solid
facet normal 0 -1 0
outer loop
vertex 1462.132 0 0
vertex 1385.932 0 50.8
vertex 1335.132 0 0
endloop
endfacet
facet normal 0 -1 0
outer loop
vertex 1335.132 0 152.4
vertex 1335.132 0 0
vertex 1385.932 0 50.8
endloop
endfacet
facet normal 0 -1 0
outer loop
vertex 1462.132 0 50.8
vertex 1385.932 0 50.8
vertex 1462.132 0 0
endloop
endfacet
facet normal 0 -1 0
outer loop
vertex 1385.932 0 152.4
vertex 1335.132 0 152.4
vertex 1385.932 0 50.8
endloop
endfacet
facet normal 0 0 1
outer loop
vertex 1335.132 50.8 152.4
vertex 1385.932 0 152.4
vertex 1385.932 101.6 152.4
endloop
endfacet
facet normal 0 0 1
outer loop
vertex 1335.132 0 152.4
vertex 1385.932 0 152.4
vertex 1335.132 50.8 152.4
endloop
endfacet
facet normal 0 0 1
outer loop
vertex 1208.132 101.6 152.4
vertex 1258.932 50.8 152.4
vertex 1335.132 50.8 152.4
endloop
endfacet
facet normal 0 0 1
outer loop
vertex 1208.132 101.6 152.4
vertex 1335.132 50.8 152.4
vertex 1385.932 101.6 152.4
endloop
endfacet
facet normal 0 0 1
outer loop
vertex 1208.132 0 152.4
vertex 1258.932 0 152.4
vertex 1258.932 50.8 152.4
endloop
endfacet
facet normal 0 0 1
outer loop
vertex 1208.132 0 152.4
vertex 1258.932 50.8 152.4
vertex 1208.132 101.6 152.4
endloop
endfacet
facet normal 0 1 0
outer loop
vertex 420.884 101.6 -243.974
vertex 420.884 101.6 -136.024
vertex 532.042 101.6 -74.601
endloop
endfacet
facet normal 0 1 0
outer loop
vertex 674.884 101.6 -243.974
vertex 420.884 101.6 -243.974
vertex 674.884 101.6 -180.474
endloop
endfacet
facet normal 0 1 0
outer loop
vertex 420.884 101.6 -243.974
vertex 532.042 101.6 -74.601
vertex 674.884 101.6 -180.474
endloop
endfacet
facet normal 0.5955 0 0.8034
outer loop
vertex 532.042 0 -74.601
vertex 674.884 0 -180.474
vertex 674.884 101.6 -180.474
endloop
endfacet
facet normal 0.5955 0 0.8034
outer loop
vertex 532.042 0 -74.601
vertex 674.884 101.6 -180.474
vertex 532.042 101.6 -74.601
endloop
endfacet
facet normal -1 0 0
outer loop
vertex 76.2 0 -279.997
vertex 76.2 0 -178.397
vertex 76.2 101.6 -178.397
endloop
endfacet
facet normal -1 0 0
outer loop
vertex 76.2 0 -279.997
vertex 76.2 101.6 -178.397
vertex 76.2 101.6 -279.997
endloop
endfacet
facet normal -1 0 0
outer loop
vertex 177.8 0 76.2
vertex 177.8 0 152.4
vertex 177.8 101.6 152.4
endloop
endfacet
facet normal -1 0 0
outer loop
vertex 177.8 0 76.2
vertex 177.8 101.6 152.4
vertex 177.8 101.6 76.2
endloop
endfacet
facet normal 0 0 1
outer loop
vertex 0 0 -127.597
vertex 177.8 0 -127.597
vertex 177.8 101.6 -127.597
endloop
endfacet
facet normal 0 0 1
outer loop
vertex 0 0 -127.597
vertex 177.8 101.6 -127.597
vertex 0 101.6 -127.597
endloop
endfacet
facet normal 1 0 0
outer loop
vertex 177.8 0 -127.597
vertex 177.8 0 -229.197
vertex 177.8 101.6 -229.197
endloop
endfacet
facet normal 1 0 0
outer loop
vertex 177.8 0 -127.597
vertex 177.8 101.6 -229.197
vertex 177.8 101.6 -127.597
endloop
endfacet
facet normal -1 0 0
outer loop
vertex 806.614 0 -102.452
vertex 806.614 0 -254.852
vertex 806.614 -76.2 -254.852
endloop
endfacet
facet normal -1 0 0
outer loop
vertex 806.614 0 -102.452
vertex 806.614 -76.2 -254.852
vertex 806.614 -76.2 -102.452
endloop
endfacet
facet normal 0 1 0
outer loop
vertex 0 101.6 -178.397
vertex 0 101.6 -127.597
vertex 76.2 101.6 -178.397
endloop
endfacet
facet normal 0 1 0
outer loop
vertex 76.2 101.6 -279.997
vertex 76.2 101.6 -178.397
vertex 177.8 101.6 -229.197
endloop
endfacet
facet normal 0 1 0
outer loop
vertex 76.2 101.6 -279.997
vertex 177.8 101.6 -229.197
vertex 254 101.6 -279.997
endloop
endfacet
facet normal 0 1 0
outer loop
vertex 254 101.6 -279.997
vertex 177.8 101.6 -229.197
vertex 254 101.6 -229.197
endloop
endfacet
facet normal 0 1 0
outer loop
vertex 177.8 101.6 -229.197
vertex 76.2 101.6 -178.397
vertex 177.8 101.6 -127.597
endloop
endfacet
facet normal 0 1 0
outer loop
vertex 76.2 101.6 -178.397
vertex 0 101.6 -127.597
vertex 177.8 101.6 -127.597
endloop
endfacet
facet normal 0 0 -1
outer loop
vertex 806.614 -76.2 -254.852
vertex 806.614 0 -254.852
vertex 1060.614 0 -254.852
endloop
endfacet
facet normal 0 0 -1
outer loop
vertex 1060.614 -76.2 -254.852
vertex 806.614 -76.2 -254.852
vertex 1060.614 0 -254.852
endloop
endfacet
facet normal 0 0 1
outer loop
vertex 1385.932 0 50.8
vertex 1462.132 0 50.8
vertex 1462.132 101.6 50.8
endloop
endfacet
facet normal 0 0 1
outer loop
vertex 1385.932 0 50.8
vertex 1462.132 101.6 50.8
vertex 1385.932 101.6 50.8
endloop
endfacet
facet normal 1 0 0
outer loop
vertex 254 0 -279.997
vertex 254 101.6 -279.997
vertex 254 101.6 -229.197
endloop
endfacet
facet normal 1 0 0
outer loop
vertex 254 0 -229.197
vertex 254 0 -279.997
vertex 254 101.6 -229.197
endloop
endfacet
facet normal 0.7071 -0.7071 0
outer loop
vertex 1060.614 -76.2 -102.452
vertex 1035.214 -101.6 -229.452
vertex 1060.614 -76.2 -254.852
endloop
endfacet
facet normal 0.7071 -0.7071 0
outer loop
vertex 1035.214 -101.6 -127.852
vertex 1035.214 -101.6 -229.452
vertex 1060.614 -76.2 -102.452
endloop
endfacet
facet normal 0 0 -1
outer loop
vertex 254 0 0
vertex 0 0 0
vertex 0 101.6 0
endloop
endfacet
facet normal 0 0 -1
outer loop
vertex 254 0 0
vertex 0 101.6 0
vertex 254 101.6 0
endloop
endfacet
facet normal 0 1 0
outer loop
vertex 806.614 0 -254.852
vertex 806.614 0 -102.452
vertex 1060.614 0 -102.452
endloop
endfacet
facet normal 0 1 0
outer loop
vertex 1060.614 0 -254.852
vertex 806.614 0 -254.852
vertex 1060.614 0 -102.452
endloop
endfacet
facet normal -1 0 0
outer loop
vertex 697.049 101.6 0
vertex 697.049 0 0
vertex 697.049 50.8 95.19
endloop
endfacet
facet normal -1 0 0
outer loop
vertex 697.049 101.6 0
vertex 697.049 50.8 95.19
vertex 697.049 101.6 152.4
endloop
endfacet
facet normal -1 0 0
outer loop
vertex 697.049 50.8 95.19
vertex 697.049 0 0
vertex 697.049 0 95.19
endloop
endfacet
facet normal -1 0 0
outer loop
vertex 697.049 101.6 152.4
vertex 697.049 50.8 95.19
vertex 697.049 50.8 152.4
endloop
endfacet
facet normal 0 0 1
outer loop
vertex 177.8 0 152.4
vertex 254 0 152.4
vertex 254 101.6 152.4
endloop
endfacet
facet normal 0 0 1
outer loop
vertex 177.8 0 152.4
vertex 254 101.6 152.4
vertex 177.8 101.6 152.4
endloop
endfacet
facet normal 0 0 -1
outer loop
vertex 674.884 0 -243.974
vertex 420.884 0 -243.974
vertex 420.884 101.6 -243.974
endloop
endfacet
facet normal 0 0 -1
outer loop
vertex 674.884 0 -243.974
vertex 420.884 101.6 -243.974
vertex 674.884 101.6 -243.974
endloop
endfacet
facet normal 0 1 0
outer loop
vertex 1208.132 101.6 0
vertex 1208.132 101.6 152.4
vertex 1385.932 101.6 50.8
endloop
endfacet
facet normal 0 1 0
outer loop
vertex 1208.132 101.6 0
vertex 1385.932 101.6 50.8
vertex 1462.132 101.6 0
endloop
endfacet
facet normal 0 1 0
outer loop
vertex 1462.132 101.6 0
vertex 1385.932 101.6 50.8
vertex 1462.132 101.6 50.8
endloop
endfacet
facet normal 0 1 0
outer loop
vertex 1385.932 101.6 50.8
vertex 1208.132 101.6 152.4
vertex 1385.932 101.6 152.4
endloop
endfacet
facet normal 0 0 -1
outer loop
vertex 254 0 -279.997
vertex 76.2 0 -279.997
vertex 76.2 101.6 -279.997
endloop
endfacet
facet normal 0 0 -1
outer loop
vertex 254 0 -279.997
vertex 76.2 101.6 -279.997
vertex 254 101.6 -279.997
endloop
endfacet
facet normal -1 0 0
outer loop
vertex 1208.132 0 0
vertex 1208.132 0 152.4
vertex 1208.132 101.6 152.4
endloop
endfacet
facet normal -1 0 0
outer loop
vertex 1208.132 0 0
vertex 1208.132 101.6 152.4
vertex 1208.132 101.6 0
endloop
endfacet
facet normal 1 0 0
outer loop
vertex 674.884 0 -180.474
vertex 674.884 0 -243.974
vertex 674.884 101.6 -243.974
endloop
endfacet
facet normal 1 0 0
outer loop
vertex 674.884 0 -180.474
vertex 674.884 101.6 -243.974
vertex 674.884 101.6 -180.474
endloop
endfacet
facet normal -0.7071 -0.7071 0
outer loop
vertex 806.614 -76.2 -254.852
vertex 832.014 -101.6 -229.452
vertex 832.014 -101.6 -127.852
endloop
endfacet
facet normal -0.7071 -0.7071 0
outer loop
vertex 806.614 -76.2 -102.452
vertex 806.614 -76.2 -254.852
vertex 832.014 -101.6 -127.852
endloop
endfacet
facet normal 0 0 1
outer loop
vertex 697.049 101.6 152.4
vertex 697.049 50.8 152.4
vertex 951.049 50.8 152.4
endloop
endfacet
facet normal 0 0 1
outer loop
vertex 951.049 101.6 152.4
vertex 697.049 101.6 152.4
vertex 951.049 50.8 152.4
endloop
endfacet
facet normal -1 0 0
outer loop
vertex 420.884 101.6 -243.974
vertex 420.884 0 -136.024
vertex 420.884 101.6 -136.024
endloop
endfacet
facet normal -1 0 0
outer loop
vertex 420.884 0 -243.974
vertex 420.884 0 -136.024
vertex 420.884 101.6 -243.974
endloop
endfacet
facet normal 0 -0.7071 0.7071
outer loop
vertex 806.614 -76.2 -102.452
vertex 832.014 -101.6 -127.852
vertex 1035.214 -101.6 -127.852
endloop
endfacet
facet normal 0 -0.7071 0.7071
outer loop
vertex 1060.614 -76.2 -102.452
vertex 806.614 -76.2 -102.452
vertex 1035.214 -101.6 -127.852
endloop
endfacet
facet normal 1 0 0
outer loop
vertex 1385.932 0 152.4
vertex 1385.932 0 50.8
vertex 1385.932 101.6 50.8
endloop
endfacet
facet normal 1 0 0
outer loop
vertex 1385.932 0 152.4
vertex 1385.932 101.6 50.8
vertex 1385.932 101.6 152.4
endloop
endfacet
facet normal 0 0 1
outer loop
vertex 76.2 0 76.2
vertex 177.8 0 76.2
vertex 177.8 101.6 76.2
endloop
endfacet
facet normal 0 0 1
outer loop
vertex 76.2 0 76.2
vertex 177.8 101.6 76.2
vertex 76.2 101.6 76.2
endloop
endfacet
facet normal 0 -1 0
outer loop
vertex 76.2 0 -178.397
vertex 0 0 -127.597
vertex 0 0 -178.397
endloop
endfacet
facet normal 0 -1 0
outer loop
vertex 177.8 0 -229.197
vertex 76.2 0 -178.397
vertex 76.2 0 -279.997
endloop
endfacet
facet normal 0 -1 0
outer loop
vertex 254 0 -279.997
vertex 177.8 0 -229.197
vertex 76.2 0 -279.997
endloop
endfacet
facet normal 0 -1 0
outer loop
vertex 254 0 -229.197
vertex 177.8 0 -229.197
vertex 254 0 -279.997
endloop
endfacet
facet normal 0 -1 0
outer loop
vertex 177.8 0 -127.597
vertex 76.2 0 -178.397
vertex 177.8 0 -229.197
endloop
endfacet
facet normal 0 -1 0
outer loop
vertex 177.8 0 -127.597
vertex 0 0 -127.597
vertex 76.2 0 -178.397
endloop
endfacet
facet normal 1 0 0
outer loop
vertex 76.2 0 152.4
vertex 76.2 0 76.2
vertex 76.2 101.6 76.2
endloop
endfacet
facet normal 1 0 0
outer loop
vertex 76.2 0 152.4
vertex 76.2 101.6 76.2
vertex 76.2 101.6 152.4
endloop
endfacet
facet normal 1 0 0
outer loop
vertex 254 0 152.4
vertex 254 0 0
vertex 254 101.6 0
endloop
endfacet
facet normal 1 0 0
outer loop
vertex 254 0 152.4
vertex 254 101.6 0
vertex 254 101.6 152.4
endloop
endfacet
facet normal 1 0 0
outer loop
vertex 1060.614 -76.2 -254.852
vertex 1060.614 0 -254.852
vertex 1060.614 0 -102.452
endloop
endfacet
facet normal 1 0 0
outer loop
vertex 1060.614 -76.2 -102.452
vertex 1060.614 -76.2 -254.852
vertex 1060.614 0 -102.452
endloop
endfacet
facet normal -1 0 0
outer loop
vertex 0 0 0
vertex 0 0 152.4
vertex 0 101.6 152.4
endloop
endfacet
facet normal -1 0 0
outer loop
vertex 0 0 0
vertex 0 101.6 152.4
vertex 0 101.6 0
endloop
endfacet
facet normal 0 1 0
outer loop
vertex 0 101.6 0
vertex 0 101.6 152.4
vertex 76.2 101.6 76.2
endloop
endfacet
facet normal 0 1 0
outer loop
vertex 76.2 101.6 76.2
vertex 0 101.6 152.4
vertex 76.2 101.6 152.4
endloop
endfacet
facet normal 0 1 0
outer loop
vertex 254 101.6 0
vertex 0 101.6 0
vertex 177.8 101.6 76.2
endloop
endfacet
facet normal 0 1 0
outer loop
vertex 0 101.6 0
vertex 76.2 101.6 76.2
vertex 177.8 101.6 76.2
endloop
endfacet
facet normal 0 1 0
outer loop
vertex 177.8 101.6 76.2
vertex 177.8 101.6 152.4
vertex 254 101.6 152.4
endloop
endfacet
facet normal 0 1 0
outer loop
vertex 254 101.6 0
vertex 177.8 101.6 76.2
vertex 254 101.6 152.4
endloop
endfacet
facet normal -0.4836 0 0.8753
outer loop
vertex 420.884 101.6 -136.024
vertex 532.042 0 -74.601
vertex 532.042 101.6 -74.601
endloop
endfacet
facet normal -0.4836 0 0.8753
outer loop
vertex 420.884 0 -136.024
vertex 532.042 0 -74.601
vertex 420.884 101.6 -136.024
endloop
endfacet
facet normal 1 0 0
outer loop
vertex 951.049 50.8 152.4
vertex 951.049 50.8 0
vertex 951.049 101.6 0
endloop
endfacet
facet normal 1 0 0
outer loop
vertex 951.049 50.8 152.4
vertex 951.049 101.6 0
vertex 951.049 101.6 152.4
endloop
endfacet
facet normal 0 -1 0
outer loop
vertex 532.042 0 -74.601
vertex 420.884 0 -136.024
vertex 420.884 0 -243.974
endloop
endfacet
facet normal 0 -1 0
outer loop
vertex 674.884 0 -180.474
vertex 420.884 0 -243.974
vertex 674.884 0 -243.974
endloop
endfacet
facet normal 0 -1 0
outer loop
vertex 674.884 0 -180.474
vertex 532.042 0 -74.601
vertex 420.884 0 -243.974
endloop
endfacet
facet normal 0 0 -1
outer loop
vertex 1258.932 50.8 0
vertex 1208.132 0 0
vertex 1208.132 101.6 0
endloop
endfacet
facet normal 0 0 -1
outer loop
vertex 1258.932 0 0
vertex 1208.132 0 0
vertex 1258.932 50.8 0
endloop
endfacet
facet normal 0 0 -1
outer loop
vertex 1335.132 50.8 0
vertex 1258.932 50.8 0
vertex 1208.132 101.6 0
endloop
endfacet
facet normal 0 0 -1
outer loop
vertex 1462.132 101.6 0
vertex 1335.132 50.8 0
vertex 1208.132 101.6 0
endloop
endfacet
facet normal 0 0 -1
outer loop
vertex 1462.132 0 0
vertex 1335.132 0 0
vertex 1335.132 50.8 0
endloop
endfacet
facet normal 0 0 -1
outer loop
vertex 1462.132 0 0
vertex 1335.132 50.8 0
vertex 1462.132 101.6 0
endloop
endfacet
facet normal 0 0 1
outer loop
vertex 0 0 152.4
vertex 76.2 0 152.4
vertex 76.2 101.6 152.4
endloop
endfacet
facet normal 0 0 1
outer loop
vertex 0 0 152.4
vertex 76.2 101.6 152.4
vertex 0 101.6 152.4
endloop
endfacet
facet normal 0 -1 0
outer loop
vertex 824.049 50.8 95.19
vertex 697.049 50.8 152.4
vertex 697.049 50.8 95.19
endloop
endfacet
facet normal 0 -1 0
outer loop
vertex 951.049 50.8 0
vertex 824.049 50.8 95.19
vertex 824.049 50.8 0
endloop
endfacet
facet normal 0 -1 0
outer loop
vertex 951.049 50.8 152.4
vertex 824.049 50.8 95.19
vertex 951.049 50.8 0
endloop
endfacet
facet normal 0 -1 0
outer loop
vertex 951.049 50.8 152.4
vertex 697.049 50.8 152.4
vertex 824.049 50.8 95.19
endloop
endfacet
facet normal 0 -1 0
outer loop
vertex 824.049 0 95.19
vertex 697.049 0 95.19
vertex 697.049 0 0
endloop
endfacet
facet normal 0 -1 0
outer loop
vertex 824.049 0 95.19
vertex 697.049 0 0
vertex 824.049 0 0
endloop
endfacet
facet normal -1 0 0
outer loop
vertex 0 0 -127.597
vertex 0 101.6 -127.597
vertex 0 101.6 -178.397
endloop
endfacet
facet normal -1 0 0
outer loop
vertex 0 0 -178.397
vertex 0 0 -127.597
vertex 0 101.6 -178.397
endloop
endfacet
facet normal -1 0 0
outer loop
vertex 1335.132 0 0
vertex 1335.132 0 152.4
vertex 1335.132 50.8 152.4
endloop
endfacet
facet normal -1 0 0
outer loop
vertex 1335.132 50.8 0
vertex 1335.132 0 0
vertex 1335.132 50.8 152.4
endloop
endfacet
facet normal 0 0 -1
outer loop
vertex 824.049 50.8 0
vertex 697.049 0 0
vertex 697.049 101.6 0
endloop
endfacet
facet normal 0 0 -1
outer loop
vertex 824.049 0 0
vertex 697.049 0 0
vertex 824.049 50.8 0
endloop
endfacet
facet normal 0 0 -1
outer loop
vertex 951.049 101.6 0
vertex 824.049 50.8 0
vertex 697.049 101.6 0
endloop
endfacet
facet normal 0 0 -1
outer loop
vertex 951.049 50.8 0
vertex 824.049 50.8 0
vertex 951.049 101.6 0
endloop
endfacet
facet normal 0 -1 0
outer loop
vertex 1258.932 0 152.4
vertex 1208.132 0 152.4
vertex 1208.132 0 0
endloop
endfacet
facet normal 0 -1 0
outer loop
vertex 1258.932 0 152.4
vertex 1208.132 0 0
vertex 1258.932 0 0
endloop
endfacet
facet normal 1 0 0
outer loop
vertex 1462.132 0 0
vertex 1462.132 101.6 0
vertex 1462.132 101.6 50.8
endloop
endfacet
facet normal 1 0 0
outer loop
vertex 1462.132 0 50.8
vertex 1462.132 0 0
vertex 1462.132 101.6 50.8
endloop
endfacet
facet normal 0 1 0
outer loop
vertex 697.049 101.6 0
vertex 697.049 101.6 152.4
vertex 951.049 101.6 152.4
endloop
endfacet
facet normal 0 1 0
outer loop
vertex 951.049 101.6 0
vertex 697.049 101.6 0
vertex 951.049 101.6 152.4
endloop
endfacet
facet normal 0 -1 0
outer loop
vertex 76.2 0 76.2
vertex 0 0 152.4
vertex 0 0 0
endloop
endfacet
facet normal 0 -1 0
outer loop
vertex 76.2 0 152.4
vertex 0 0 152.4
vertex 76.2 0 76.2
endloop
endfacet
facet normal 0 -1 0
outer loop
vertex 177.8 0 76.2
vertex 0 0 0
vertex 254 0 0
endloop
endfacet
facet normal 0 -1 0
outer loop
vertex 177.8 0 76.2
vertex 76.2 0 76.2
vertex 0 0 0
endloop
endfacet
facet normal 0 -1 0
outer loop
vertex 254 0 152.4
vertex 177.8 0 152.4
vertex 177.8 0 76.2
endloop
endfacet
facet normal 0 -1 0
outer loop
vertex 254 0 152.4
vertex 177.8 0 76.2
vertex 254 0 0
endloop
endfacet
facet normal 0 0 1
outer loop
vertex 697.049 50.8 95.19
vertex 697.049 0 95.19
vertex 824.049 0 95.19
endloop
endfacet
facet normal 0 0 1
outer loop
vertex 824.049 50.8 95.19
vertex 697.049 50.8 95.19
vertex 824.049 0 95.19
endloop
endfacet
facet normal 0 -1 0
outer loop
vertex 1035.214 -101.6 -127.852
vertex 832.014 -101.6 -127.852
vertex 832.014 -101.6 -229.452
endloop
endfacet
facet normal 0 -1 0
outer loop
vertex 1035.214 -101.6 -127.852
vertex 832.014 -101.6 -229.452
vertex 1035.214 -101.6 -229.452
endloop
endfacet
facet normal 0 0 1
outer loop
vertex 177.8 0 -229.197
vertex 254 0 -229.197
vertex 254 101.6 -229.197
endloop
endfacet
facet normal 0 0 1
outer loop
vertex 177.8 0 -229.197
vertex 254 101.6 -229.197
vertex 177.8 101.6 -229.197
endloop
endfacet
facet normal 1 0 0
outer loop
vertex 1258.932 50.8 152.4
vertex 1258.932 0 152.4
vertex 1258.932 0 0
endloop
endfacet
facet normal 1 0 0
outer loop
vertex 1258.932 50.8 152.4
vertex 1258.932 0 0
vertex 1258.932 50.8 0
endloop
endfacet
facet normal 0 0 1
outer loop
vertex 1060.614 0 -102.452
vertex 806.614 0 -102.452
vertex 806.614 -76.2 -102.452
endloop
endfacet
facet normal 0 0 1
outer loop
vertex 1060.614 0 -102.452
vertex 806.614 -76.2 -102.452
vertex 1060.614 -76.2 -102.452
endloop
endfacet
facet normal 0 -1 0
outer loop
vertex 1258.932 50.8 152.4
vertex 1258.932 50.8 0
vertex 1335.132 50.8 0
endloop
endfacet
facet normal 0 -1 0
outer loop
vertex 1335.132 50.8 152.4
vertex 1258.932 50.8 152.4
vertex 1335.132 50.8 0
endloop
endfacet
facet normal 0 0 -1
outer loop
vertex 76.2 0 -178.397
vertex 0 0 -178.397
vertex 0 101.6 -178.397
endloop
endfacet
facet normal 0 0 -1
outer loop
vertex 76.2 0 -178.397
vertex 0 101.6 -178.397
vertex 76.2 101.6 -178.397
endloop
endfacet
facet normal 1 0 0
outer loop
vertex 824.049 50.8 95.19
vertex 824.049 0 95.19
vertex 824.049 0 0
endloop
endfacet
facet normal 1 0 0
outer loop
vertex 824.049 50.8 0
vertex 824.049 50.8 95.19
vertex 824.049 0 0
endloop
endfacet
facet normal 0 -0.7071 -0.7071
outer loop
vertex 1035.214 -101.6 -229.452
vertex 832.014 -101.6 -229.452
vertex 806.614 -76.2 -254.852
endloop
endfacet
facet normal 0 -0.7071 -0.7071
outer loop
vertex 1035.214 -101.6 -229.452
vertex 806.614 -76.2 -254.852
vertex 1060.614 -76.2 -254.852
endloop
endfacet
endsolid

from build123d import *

# Parameters (mm, degrees)
F1_DEPTH  = 101.6
F2_W      = 254
F2_H      = 152.4
F3_DEPTH  = 101.6
F5_DEPTH  = 50.8
F7_DEPTH  = 101.6
F8_W      = 76.2
F8_H      = 50.8
F9_DEPTH  = 152.4
F11_DEPTH = 101.6
F13_DEPTH = 101.6
F14_W     = 254
F14_H     = 152.4
F15_DEPTH = 101.6
F16_SIZE  = 25.4


with BuildPart() as f1:
    # F0 (on Front) → F1 (new body)
    with BuildSketch(Plane.XZ):
        Polygon((0, 152.4), (0, 0), (254, 0), (254, 152.4), (177.8, 152.4), (177.8, 76.2), (76.2, 76.2), (76.2, 152.4), align=None)
    extrude(amount=-F1_DEPTH)


with BuildPart() as f3:
    # F2 (on Front) → F3 (new body)
    with BuildSketch(Plane.XZ):
        with Locations((824.049418, 76.2)):
            Rectangle(F2_W, F2_H)
    extrude(amount=-F3_DEPTH)

    # F4 (on face) → F5 (cut)
    with BuildSketch(Plane.XZ):
        Polygon((824.049418, 0), (951.049418, 0), (951.049418, 152.4), (697.049418, 152.4), (697.049418, 95.189988), (824.049418, 95.189988), align=None)
    extrude(amount=-F5_DEPTH, mode=Mode.SUBTRACT)


with BuildPart() as f7:
    # F6 (on Front) → F7 (new body)
    with BuildSketch(Plane.XZ):
        Polygon((1208.132236, 152.4), (1208.132236, 0), (1462.132236, 0), (1462.132236, 50.8), (1385.932236, 50.8), (1385.932236, 152.4), align=None)
    extrude(amount=-F7_DEPTH)

    # F8 (on face) → F9 (cut)
    with BuildSketch(Plane.XY.offset(152.4)):
        with Locations((1297.032236, 25.4)):
            Rectangle(F8_W, F8_H)
    extrude(amount=-F9_DEPTH, mode=Mode.SUBTRACT)


with BuildPart() as f11:
    # F10 (on Front) → F11 (new body)
    with BuildSketch(Plane.XZ):
        Polygon((0, -127.597199), (0, -178.397199), (76.2, -178.397199), (76.2, -279.997199), (254, -279.997199), (254, -229.197199), (177.8, -229.197199), (177.8, -127.597199), align=None)
    extrude(amount=-F11_DEPTH)


with BuildPart() as f13:
    # F12 (on Front) → F13 (new body)
    with BuildSketch(Plane.XZ):
        Polygon((420.883868, -136.024201), (420.883868, -243.974201), (674.883868, -243.974201), (674.883868, -180.474201), (532.042295, -74.601046), align=None)
    extrude(amount=-F13_DEPTH)


with BuildPart() as f15:
    # F14 (on Front) → F15 (new body)
    with BuildSketch(Plane.XZ):
        with Locations((933.613863, -178.651858)):
            Rectangle(F14_W, F14_H)
    extrude(amount=F15_DEPTH)

    # F16
    f16_edges = [f15.edges().sort_by_distance(p)[0] for p in [
        (806.613863, -101.6, -178.651858),
        (933.613863, -101.6, -254.851858),
        (1060.613863, -101.6, -178.651858),
        (933.613863, -101.6, -102.451858),
    ]]
    chamfer(f16_edges, length=F16_SIZE)


solid = Compound([f1.part, f3.part, f7.part, f11.part, f13.part, f15.part])
